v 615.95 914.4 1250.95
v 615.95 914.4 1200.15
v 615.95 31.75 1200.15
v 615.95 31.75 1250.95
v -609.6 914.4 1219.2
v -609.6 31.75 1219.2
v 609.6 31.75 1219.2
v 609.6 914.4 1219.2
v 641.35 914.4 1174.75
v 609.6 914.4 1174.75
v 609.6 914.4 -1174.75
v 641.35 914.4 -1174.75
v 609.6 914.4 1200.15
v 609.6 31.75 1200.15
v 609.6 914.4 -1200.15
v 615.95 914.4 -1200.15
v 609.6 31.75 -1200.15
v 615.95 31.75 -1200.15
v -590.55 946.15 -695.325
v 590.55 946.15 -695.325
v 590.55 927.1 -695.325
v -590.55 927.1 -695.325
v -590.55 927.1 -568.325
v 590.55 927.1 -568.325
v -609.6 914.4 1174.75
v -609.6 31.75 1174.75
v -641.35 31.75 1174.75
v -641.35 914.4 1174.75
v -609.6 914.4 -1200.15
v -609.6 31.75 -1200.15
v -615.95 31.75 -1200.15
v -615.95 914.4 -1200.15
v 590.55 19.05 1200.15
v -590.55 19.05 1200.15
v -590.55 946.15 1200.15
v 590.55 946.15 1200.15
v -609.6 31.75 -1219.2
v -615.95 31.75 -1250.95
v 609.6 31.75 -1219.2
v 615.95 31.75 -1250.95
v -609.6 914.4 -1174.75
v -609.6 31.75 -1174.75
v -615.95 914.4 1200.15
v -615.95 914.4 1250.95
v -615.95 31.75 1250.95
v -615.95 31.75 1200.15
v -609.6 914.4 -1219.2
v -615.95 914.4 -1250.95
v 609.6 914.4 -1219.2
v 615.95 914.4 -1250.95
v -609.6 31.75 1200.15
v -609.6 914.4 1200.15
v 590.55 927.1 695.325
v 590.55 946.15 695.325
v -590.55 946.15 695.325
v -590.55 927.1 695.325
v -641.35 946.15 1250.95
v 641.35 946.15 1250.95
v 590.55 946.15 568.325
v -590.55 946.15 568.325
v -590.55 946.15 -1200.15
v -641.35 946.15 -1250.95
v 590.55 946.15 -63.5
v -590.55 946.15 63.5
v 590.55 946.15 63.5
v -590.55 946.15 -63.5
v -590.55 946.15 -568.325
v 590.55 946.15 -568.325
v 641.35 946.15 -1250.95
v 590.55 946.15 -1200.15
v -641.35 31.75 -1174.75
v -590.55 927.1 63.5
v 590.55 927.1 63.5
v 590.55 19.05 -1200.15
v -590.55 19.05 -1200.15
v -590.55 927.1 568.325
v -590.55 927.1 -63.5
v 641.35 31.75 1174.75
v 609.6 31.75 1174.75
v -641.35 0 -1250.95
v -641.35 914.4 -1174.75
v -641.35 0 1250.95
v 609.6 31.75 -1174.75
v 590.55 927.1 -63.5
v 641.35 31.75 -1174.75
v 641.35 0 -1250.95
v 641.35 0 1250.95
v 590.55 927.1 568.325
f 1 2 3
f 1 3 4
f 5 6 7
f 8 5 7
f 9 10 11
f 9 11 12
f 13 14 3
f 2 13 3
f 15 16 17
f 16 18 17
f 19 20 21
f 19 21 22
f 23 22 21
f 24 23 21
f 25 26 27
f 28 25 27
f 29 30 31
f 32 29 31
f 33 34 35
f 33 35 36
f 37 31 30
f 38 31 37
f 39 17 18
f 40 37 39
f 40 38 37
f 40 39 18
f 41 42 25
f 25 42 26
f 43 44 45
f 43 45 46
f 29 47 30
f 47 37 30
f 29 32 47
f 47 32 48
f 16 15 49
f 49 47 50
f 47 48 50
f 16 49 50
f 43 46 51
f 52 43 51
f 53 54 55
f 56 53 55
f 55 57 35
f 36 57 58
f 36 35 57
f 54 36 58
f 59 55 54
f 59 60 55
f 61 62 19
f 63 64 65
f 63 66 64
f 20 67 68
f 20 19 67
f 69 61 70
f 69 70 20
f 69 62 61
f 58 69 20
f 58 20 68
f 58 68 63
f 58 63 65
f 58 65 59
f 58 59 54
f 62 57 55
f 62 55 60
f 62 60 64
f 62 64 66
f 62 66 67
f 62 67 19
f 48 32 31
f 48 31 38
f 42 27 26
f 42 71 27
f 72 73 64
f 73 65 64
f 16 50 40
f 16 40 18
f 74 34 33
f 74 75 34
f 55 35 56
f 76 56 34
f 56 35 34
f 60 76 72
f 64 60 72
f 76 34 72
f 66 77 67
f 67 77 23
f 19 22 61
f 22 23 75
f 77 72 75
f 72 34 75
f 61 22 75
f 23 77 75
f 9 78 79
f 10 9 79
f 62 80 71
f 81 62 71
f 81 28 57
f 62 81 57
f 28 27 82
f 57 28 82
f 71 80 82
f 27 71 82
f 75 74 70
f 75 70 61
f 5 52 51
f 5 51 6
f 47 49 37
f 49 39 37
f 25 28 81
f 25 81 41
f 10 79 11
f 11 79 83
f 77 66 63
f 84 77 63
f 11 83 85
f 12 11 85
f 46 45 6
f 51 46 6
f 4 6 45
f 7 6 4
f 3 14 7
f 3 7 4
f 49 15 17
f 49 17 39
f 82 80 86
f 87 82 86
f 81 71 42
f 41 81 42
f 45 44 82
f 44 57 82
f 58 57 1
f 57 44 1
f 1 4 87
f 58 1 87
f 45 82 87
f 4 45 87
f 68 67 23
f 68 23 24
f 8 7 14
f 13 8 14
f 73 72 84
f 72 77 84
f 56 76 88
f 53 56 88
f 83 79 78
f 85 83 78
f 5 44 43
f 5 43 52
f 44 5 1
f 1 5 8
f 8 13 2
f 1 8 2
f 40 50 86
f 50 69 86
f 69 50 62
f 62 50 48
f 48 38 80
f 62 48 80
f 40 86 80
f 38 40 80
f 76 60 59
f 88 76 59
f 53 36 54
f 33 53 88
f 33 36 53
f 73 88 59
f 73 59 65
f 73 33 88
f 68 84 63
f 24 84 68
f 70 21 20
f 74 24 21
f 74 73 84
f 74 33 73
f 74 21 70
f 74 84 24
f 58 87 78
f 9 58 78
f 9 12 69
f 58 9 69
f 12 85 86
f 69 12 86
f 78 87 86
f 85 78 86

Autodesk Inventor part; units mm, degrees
ref_plane "YZ Plane" through (0, 0, 0) normal (1, 0, 0) x (0, 1, 0)
ref_plane "XZ Plane" through (0, 0, 0) normal (0, 1, 0) x (-1, 0, 0)
ref_plane "XY Plane" through (0, 0, 0) normal (0, 0, 1) x (1, 0, 0)
sketch "Sketch1" plane through (0, 0, 0) normal (0, 1, 0) x (-1, 0, 0)
  line L0 (-609.6, -1219.2) -> (609.6, -1219.2)
  line L1 (609.6, -1219.2) -> (609.6, 1219.2)
  line L2 (609.6, 1219.2) -> (-609.6, 1219.2)
  line L3 (-609.6, 1219.2) -> (-609.6, -1219.2)
  line L4 (-609.6, -1219.2) -> (609.6, 1219.2) construction
  line L5 (609.6, -1219.2) -> (-609.6, 1219.2) construction
  point P0 (0, 0)
  dimension "d0" = 1219.2
  dimension "d1" = 2438.4
extrude "Extrusion1" add sketch "Sketch1" along normal blind 914.4
sketch "Sketch2" plane through (0, 914.4, 0) normal (0, 1, 0) x (1, 0, 0)
  line L0 (590.55, 1200.15) -> (-590.55, 1200.15)
  line L1 (-590.55, 1200.15) -> (-590.55, -1200.15)
  line L2 (-590.55, -1200.15) -> (590.55, -1200.15)
  line L3 (590.55, -1200.15) -> (590.55, 1200.15)
  line L4 (590.55, 1200.15) -> (-590.55, -1200.15) construction
  line L5 (-590.55, 1200.15) -> (590.55, -1200.15) construction
  point P0 (0, 0)
  dimension "d4" = 1181.1
  dimension "d5" = 2400.3
extrude "Extrusion2" cut sketch "Sketch2" against normal blind 895.35
sketch "Sketch3" plane through (0, 914.4, 0) normal (0, 1, 0) x (1, 0, 0)
  line L0 (641.35, 1250.95) -> (-641.35, 1250.95)
  line L1 (-641.35, 1250.95) -> (-641.35, -1250.95)
  line L2 (-641.35, -1250.95) -> (641.35, -1250.95)
  line L3 (641.35, -1250.95) -> (641.35, 1250.95)
  line L4 (641.35, 1250.95) -> (-641.35, -1250.95) construction
  line L5 (-641.35, 1250.95) -> (641.35, -1250.95) construction
  line L6 (-590.55, -1200.15) -> (-590.55, 1200.15) projected
  line L7 (590.55, 1200.15) -> (-590.55, 1200.15)
  line L8 (-590.55, 1200.15) -> (-590.55, -1200.15)
  line L9 (-590.55, -1200.15) -> (590.55, -1200.15)
  line L10 (590.55, -1200.15) -> (590.55, 1200.15)
  line L11 (590.55, 1200.15) -> (-590.55, -1200.15) construction
  line L12 (-590.55, 1200.15) -> (590.55, -1200.15) construction
  point P0 (0, 0)
  point P1 (-590.55, 1200.15)
  dimension "d8" = 1282.7
  dimension "d9" = 2501.9
extrude "Extrusion3" add sketch "Sketch3" along normal blind 31.75
pattern_linear "Rectangular Pattern1" count 2 spacing 914.4 along (0, -1, 0) of "Extrusion3"
sketch "Sketch4" plane through (-641.35, 31.75, 1250.95) normal (0, 1, 0) x (1, 0, 0)
  line L0 (0, 0) -> (1282.7, 0) projected
  line L1 (1282.7, 0) -> (1282.7, 76.2)
  line L2 (1282.7, 0) -> (1282.7, 2501.9) projected
  line L3 (1282.7, 76.2) -> (1231.9, 76.2)
  line L4 (1231.9, 2451.1) -> (1231.9, 50.8) projected
  line L5 (1231.9, 76.2) -> (1231.9, 50.8)
  line L6 (1231.9, 50.8) -> (1257.3, 50.8)
  line L7 (1231.9, 50.8) -> (50.8, 50.8) projected
  line L8 (1257.3, 50.8) -> (1257.3, 0)
  line L9 (1257.3, 0) -> (1282.7, 0)
  point P0 (641.35, 1250.95)
  point P1 (1257.3, 0)
  dimension "d15" = 76.2
  dimension "d16" = 50.8
  dimension "d17" = 25.4
  dimension "d23" = 25.4
  dimension "d24" = 50.8
  dimension "d25" = 25.4
extrude "Extrusion4" add sketch "Sketch4" along normal blind 889
mirror "Mirror2" about plane through (0, 0, 0) normal (1, 0, 0) of "Extrusion4"
mirror "Mirror3" about plane through (0, 0, 0) normal (0, 0, 1) of "Extrusion4", "Mirror2"
sketch "Sketch5" plane through (0, 946.15, 0) normal (0, 1, 0) x (1, 0, 0)
  line L0 (-590.55, -1200.15) -> (-590.55, 1200.15) projected
  line L1 (590.55, -695.325) -> (-590.55, -695.325)
  line L2 (-590.55, -695.325) -> (-590.55, -568.325)
  line L3 (-590.55, -568.325) -> (590.55, -568.325)
  line L4 (590.55, -568.325) -> (590.55, -695.325)
  line L5 (590.55, -695.325) -> (-590.55, -568.325) construction
  line L6 (-590.55, -695.325) -> (590.55, -568.325) construction
  line L7 (590.55, 695.325) -> (-590.55, 695.325)
  line L8 (-590.55, 695.325) -> (-590.55, 568.325)
  line L9 (-590.55, 568.325) -> (590.55, 568.325)
  line L10 (590.55, 568.325) -> (590.55, 695.325)
  line L11 (590.55, 695.325) -> (-590.55, 568.325) construction
  line L12 (-590.55, 695.325) -> (590.55, 568.325) construction
  line L13 (590.55, -63.5) -> (-590.55, -63.5)
  line L14 (-590.55, -63.5) -> (-590.55, 63.5)
  line L15 (-590.55, 63.5) -> (590.55, 63.5)
  line L16 (590.55, 63.5) -> (590.55, -63.5)
  line L17 (590.55, -63.5) -> (-590.55, 63.5) construction
  line L18 (-590.55, -63.5) -> (590.55, 63.5) construction
  line L19 (-590.55, 1200.15) -> (590.55, 1200.15) projected
  line L20 (590.55, -1200.15) -> (-590.55, -1200.15) projected
  point P0 (0, 0)
  point P1 (0, -631.825)
  point P2 (0, 631.825)
  point P3 (-590.55, -63.5)
  point P4 (-590.55, 695.325)
  dimension "d26" = 127
  dimension "d27" = 127
  dimension "d28" = 127
  dimension "d31" = 504.825
  dimension "d32" = 504.825
  dimension "d33" = 504.825
  dimension "d34" = 504.825
extrude "Extrusion5" add sketch "Sketch5" against normal blind 19.05
properties part number "CustomAquariumsTank"
